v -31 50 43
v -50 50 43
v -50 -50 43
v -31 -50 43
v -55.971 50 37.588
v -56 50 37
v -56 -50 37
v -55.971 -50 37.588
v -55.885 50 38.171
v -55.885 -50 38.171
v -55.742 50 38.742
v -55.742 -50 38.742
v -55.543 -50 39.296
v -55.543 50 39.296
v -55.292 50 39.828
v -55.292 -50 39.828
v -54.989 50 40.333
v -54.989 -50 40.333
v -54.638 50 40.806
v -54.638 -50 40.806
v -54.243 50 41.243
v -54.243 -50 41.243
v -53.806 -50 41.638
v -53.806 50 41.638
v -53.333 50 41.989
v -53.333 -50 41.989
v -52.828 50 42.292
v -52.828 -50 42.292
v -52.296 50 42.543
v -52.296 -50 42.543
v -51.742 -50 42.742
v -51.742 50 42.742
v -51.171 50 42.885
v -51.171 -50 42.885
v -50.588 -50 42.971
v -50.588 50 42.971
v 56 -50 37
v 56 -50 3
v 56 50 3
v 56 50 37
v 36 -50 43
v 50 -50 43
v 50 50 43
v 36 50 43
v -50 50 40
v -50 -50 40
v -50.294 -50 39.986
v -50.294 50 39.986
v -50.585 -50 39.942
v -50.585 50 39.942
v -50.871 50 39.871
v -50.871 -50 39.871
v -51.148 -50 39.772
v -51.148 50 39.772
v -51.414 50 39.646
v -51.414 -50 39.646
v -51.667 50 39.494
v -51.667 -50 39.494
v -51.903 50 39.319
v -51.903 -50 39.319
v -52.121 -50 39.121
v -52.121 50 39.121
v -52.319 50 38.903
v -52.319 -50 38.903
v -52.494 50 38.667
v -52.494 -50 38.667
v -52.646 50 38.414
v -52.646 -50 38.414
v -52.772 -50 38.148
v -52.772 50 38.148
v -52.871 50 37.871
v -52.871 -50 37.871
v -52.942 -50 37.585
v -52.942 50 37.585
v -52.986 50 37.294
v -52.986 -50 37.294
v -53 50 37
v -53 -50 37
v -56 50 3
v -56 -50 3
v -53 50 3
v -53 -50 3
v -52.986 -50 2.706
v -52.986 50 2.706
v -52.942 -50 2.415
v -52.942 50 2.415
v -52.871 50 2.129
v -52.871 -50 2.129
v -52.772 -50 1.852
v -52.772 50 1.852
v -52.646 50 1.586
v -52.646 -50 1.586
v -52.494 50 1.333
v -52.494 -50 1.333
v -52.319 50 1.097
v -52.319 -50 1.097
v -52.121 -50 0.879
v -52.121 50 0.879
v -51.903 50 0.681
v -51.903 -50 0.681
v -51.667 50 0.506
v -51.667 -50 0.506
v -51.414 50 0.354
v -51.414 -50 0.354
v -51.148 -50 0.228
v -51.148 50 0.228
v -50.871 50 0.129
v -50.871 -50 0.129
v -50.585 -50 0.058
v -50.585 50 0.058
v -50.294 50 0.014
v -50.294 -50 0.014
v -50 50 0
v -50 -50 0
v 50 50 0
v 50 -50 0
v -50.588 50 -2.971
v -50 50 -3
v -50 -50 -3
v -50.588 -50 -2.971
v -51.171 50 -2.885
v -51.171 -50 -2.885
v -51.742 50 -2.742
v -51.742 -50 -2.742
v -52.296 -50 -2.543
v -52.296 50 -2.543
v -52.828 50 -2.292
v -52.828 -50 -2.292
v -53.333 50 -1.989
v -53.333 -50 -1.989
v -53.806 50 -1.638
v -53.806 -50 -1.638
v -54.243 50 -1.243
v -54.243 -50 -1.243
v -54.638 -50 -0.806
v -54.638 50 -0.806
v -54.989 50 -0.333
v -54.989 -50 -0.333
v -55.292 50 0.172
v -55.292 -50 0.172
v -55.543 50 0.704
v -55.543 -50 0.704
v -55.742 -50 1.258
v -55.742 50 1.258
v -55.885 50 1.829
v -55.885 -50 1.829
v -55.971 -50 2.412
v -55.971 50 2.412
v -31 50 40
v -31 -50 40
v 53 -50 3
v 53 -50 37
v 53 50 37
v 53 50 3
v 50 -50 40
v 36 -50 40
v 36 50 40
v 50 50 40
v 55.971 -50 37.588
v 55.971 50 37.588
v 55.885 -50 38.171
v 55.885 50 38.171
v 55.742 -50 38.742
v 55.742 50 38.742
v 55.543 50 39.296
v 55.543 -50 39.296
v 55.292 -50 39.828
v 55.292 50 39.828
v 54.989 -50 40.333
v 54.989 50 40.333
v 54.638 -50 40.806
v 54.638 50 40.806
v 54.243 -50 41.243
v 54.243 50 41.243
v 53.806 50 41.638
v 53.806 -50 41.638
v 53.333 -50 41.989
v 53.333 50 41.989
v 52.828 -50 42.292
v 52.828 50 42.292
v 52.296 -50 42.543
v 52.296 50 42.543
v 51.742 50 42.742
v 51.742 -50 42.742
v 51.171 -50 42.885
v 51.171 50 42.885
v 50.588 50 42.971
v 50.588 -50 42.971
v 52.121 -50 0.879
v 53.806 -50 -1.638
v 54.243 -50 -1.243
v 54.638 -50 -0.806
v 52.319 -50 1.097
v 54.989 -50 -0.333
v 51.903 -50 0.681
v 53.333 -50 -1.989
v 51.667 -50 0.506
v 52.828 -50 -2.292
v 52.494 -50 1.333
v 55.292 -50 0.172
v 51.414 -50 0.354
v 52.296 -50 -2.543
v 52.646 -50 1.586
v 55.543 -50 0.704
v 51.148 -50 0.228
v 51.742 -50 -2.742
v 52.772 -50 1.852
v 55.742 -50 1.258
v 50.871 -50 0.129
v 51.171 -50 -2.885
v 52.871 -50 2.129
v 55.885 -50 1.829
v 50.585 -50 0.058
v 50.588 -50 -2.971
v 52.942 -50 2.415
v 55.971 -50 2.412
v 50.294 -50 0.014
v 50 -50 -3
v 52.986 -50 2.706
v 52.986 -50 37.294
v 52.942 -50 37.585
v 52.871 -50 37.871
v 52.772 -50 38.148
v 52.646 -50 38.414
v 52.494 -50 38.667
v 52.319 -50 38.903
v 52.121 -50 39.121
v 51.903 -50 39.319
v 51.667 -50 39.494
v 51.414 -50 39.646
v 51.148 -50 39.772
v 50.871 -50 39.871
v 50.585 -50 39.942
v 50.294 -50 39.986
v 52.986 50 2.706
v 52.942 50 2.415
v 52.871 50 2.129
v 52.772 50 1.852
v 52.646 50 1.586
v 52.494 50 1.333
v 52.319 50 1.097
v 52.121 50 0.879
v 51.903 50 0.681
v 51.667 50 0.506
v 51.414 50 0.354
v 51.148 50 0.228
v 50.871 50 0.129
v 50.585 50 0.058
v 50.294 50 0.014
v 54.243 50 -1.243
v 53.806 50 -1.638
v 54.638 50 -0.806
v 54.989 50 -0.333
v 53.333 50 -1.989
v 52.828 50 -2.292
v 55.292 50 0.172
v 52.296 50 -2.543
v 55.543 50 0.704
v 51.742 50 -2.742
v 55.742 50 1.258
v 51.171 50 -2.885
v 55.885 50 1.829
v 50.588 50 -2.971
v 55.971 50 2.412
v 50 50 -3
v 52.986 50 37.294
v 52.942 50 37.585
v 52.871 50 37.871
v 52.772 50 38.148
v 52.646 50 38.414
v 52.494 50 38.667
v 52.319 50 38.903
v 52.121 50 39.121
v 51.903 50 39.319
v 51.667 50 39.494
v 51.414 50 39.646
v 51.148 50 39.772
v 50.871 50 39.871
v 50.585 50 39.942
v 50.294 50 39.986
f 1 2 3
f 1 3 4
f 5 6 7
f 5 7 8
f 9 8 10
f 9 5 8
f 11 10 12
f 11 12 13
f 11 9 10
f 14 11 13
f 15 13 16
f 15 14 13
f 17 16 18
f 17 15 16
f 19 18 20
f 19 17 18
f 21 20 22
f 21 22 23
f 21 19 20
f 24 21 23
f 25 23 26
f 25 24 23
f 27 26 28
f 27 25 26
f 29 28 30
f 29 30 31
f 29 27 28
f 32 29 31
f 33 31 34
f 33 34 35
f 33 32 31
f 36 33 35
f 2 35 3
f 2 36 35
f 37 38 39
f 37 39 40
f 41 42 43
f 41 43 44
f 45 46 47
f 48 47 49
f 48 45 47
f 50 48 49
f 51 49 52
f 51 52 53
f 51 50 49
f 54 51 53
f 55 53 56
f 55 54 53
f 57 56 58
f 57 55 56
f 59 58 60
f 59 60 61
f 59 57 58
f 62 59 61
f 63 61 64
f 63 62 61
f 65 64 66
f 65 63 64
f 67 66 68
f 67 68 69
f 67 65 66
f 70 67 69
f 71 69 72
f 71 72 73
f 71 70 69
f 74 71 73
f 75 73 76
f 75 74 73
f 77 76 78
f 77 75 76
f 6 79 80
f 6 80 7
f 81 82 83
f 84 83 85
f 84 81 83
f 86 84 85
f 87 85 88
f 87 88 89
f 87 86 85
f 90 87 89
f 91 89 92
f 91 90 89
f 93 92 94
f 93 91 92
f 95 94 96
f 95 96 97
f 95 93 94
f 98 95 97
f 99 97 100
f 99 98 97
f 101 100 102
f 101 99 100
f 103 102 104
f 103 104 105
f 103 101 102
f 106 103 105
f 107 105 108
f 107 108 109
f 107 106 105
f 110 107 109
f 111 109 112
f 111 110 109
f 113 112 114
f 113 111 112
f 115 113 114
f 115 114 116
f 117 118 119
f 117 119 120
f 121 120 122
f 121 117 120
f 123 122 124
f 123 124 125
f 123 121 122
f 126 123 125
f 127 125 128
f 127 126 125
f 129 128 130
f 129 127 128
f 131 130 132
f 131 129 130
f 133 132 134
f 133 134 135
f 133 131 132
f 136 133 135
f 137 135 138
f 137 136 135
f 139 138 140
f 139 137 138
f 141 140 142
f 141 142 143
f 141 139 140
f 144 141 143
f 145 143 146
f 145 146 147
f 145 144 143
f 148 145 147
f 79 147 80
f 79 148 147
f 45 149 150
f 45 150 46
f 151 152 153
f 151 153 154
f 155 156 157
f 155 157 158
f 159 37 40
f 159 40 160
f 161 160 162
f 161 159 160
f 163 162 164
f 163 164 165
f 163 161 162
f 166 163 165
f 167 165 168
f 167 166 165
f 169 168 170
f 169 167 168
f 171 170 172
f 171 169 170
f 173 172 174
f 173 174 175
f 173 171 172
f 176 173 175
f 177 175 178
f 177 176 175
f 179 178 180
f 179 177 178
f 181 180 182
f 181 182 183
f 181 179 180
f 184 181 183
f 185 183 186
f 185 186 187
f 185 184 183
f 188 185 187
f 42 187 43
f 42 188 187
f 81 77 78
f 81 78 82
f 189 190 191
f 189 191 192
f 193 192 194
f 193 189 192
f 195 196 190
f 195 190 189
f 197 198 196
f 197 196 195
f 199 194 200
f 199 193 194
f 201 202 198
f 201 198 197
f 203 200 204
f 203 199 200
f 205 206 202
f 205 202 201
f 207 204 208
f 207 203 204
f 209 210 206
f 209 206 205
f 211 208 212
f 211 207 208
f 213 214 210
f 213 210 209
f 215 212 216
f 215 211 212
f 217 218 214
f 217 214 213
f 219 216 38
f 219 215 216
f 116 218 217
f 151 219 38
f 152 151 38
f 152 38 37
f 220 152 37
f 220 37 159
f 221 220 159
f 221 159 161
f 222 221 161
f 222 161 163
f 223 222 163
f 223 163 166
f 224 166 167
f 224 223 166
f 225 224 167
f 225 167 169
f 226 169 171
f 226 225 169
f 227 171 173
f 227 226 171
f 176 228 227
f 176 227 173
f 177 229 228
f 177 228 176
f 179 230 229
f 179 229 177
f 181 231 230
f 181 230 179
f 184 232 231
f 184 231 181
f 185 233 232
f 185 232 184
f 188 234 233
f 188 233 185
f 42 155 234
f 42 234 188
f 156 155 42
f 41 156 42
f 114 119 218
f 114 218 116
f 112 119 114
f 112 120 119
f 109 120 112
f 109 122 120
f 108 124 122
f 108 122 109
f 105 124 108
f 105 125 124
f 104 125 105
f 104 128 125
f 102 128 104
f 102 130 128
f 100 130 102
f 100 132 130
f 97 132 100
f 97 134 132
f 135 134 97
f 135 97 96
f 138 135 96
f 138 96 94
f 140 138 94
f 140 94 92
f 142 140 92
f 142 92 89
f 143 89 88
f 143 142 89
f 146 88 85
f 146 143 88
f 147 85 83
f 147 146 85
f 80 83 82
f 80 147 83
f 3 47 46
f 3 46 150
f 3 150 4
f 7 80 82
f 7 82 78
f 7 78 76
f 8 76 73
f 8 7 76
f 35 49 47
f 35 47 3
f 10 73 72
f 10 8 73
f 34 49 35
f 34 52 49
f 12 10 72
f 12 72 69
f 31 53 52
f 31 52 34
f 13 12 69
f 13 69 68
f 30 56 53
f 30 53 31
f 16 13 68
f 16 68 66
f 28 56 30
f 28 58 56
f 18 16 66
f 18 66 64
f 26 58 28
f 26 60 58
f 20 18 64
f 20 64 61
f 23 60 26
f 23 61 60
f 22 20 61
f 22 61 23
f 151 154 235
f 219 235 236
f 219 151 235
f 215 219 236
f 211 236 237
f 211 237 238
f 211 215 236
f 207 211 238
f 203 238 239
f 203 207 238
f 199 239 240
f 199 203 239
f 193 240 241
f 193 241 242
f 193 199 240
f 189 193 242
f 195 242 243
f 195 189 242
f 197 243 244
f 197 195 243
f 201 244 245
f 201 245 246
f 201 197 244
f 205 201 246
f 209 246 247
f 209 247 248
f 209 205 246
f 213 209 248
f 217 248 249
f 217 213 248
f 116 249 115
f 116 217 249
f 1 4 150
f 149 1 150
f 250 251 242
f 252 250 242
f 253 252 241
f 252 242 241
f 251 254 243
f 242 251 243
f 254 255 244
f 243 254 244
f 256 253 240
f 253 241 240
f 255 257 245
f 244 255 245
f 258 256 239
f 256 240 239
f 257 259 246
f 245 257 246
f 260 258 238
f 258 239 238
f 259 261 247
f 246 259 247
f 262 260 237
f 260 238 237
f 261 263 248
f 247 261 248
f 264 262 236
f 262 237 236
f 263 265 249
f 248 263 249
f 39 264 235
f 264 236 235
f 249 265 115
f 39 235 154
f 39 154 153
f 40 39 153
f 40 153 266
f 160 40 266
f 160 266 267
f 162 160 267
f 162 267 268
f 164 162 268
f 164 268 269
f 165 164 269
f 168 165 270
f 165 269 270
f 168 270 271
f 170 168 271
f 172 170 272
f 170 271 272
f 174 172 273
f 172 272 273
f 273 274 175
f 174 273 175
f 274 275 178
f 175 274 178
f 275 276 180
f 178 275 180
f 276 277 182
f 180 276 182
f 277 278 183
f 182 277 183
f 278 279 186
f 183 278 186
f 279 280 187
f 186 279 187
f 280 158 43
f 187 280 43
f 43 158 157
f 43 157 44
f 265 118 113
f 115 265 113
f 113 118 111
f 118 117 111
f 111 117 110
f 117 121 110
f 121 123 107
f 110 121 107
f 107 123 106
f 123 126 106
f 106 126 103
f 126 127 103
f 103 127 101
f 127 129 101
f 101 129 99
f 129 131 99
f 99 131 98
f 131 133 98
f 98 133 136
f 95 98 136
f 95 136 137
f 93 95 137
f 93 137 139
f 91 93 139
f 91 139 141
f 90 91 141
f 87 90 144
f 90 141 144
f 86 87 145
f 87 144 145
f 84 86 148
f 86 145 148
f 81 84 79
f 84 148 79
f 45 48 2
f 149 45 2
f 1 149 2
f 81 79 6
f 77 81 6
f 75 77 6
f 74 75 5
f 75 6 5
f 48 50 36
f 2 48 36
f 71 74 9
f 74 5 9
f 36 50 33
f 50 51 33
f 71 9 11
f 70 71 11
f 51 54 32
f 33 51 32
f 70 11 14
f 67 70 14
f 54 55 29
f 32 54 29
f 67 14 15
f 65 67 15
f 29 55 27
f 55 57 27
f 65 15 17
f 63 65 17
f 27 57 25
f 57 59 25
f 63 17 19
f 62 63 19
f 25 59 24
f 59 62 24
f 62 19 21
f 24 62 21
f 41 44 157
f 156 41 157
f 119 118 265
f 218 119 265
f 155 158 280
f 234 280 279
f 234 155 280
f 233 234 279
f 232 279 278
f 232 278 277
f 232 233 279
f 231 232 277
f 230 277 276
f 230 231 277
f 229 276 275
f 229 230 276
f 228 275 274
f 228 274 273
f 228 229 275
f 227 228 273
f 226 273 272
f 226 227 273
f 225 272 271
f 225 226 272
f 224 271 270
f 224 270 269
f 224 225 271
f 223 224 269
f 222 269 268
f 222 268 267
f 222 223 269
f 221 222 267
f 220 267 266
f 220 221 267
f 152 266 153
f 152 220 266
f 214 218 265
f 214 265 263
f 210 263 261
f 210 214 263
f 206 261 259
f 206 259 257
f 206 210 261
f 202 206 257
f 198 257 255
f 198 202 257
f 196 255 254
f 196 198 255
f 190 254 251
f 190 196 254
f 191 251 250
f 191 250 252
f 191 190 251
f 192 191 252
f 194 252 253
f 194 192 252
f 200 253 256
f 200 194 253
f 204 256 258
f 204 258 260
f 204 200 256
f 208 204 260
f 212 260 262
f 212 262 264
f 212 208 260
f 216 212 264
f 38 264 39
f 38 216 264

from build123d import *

# Parameters (mm, degrees)
SKETCH1_W          = 100
SKETCH1_H          = 100
BASE_FLANGE1_DEPTH = 3
EDGE_FLANGE1_DEPTH = 100
EDGE_FLANGE2_DEPTH = 100
EDGE_FLANGE6_DEPTH = 100
EDGE_FLANGE7_DEPTH = 100


# Sheet-metal steps are written as plain solids
with BuildPart() as part:
    # Sketch1 → Base-Flange1 (new body)
    with BuildSketch(Plane.XY):
        Rectangle(SKETCH1_W, SKETCH1_H)
    extrude(amount=-BASE_FLANGE1_DEPTH)

    # Edge-Flange1 section (across the edge) → Edge-Flange1 (add)
    with BuildSketch(Plane(origin=(-53, 50, 0), x_dir=(1, 0, 0), z_dir=(0, -1, 0))):
        with BuildLine():
            Line((-3, 3), (-3, 37))
            Line((-3, 37), (0, 37))
            Line((0, 37), (0, 3))
            ThreePointArc((0, 3), (0.878679656, 0.878679656), (3, 0))
            Line((3, 0), (3, -3))
            ThreePointArc((3, -3), (-1.242640687, -1.242640687), (-3, 3))
        make_face()
    extrude(amount=EDGE_FLANGE1_DEPTH)

    # Edge-Flange2 section (across the edge) → Edge-Flange2 (add)
    with BuildSketch(Plane(origin=(53, -50, 0), x_dir=(-1, 0, 0), z_dir=(0, 1, 0))):
        with BuildLine():
            Line((-3, 3), (-3, 37))
            Line((-3, 37), (0, 37))
            Line((0, 37), (0, 3))
            ThreePointArc((0, 3), (0.878679656, 0.878679656), (3, 0))
            Line((3, 0), (3, -3))
            ThreePointArc((3, -3), (-1.242640687, -1.242640687), (-3, 3))
        make_face()
    extrude(amount=EDGE_FLANGE2_DEPTH)

    # Edge-Flange6 section (across the edge) → Edge-Flange6 (add)
    with BuildSketch(Plane(origin=(-53, 50, 40), x_dir=(0, 0, -1), z_dir=(0, -1, 0))):
        with BuildLine():
            Line((-3, 3), (-3, 22))
            Line((-3, 22), (0, 22))
            Line((0, 22), (0, 3))
            ThreePointArc((0, 3), (0.878679656, 0.878679656), (3, 0))
            Line((3, 0), (3, -3))
            ThreePointArc((3, -3), (-1.242640687, -1.242640687), (-3, 3))
        make_face()
    extrude(amount=EDGE_FLANGE6_DEPTH)

    # Edge-Flange7 section (across the edge) → Edge-Flange7 (add)
    with BuildSketch(Plane(origin=(53, -50, 40), x_dir=(0, 0, -1), z_dir=(0, 1, 0))):
        with BuildLine():
            Line((-3, 3), (-3, 17))
            Line((-3, 17), (0, 17))
            Line((0, 17), (0, 3))
            ThreePointArc((0, 3), (0.878679656, 0.878679656), (3, 0))
            Line((3, 0), (3, -3))
            ThreePointArc((3, -3), (-1.242640687, -1.242640687), (-3, 3))
        make_face()
    extrude(amount=EDGE_FLANGE7_DEPTH)


solid = part.part
